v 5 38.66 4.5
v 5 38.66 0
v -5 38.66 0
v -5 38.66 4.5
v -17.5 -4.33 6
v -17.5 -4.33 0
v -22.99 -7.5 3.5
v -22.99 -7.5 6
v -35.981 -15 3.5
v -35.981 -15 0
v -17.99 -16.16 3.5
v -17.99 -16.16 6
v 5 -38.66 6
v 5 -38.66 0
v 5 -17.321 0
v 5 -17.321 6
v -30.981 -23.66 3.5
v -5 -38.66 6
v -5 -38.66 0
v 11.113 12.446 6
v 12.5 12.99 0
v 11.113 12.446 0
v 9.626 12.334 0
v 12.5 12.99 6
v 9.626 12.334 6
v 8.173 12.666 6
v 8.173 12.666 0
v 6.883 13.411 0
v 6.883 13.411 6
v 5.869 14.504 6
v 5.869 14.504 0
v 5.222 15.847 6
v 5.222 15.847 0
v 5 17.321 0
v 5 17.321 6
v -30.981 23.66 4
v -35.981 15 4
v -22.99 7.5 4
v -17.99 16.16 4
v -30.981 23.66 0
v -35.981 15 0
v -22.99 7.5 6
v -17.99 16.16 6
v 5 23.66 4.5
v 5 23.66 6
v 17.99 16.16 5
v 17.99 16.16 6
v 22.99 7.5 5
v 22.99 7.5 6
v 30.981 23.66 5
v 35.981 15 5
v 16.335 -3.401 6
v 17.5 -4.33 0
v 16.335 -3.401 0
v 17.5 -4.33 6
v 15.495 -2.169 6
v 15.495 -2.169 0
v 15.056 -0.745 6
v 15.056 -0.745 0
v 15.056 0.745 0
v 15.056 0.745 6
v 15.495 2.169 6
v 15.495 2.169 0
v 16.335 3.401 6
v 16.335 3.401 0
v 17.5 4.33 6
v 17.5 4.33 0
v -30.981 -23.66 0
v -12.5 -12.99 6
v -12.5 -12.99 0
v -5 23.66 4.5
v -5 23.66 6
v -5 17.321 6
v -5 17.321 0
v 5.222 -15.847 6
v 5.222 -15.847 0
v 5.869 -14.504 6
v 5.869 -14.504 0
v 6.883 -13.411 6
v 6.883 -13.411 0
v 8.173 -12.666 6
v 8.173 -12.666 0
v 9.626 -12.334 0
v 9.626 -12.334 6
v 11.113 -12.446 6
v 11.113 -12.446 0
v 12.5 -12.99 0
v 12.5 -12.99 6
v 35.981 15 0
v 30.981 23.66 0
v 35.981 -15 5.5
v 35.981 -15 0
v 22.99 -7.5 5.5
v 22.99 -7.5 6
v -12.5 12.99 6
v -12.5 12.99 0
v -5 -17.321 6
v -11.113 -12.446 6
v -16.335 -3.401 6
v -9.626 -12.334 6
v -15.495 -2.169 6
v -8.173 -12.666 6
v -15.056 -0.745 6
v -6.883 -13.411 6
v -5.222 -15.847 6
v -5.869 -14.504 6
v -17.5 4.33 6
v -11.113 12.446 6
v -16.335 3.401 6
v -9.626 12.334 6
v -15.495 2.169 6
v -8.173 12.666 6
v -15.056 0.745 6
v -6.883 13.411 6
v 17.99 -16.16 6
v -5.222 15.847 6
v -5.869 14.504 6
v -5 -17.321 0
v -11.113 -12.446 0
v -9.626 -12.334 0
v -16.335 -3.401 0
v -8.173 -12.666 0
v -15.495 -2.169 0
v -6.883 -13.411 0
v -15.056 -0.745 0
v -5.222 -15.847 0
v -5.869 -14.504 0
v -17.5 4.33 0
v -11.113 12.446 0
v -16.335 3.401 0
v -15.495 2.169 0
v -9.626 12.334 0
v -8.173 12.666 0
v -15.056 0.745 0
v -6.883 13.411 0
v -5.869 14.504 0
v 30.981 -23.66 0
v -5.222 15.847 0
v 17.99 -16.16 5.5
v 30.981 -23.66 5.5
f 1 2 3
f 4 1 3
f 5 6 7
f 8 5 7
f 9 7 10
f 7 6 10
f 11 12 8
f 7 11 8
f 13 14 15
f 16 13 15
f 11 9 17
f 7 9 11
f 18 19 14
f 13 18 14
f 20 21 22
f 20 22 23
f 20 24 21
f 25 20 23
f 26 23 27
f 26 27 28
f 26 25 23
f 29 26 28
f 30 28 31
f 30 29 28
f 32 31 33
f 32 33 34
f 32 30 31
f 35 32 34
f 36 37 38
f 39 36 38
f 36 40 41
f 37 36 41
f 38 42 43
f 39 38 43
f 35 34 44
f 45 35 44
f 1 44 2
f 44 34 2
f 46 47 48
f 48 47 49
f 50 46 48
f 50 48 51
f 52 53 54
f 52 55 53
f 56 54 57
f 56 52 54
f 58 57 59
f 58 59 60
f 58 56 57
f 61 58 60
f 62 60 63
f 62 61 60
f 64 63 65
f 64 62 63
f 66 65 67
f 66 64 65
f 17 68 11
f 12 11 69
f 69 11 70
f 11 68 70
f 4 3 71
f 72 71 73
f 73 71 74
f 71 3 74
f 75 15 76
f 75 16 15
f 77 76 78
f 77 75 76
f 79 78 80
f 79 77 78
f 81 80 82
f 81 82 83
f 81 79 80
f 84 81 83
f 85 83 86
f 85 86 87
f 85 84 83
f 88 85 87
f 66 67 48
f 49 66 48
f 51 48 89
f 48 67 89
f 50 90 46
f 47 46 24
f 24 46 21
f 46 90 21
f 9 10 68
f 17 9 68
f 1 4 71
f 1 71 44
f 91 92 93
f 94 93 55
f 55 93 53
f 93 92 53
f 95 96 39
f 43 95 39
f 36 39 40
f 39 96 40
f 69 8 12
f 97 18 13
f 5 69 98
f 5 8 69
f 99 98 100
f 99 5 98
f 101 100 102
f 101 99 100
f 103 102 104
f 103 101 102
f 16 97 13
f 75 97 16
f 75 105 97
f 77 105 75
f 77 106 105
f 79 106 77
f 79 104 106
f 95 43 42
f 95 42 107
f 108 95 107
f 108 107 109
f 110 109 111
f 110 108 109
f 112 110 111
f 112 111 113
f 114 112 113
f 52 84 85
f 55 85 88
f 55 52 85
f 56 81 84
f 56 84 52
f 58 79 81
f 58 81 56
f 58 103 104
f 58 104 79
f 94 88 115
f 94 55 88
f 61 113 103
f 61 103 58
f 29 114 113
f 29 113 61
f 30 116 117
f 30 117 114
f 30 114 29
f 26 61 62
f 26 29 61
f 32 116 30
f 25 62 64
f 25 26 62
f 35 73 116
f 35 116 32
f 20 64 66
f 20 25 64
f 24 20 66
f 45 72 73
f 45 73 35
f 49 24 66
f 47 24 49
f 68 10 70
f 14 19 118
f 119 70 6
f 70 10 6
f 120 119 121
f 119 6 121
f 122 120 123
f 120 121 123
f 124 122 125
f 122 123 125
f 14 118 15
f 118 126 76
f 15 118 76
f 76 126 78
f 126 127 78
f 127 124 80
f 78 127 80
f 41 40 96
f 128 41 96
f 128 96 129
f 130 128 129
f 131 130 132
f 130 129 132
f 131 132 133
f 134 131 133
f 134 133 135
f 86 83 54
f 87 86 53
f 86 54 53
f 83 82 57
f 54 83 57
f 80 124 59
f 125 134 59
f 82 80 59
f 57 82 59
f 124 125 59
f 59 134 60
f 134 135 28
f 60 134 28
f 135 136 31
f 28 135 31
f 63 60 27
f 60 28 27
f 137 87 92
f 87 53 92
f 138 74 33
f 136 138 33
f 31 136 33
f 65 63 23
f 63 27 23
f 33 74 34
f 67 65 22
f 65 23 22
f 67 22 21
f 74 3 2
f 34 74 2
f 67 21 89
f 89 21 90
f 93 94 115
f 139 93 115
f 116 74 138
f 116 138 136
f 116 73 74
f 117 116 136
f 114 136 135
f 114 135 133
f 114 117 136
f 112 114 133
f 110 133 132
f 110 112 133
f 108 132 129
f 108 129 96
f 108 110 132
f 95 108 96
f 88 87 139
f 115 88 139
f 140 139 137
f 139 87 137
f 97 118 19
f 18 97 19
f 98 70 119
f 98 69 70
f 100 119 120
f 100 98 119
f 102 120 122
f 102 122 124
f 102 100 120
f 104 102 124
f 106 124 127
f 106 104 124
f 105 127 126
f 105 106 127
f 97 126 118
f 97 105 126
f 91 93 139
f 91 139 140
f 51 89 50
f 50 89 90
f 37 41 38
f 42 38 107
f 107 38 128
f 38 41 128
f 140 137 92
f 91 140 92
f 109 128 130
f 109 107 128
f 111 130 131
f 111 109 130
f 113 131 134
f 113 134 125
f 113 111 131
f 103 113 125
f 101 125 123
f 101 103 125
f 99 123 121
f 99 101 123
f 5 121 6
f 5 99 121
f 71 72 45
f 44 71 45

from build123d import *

# Parameters (mm, degrees)
F1_DEPTH = 6
F2_R     = 5
F4_DEPTH = 2.5
F5_DEPTH = 2
F3_W     = 10
F3_H     = 15
F6_DEPTH = 1.5
F7_DEPTH = 1
F8_DEPTH = 0.5


with BuildPart() as f1:
    # F0 (on Top) → F1 (new body)
    with BuildSketch(Plane.XY):
        Polygon((5, 38.660254), (-5, 38.660254), (-5, 8.660254), (-30.980762, 23.660254), (-35.980762, 15), (-10, 0), (-35.980762, -15), (-30.980762, -23.660254), (-5, -8.660254), (-5, -38.660254), (5, -38.660254), (5, -8.660254), (30.980762, -23.660254), (35.980762, -15), (10, 0), (35.980762, 15), (30.980762, 23.660254), (5, 8.660254), align=None)
    extrude(amount=F1_DEPTH)

    # F2
    f2_edges = [f1.edges().sort_by_distance(p)[0] for p in [
        (-5, 8.660254, 3),
        (5, 8.660254, 3),
        (10, 0, 3),
        (5, -8.660254, 3),
        (-5, -8.660254, 3),
        (-10, 0, 3),
    ]]
    fillet(f2_edges, radius=F2_R)

    # F3 (on face) → F4 (cut)
    with BuildSketch(Plane.XY.offset(6)):
        Polygon((-35.980762, -15), (-30.980762, -23.660254), (-17.990381, -16.160254), (-22.990381, -7.5), align=None)
    extrude(amount=-F4_DEPTH, mode=Mode.SUBTRACT)

    # F3 (on face) → F5 (cut)
    with BuildSketch(Plane.XY.offset(6)):
        Polygon((-35.980762, 15), (-22.990381, 7.5), (-17.990381, 16.160254), (-30.980762, 23.660254), align=None)
    extrude(amount=-F5_DEPTH, mode=Mode.SUBTRACT)

    # F3 (on face) → F6 (cut)
    with BuildSketch(Plane.XY.offset(6)):
        with Locations((0, 31.160254)):
            Rectangle(F3_W, F3_H)
    extrude(amount=-F6_DEPTH, mode=Mode.SUBTRACT)

    # F3 (on face) → F7 (cut)
    with BuildSketch(Plane.XY.offset(6)):
        Polygon((17.990381, 16.160254), (22.990381, 7.5), (35.980762, 15), (30.980762, 23.660254), align=None)
    extrude(amount=-F7_DEPTH, mode=Mode.SUBTRACT)

    # F3 (on face) → F8 (cut)
    with BuildSketch(Plane.XY.offset(6)):
        Polygon((22.990381, -7.5), (17.990381, -16.160254), (30.980762, -23.660254), (35.980762, -15), align=None)
    extrude(amount=-F8_DEPTH, mode=Mode.SUBTRACT)


solid = f1.part
